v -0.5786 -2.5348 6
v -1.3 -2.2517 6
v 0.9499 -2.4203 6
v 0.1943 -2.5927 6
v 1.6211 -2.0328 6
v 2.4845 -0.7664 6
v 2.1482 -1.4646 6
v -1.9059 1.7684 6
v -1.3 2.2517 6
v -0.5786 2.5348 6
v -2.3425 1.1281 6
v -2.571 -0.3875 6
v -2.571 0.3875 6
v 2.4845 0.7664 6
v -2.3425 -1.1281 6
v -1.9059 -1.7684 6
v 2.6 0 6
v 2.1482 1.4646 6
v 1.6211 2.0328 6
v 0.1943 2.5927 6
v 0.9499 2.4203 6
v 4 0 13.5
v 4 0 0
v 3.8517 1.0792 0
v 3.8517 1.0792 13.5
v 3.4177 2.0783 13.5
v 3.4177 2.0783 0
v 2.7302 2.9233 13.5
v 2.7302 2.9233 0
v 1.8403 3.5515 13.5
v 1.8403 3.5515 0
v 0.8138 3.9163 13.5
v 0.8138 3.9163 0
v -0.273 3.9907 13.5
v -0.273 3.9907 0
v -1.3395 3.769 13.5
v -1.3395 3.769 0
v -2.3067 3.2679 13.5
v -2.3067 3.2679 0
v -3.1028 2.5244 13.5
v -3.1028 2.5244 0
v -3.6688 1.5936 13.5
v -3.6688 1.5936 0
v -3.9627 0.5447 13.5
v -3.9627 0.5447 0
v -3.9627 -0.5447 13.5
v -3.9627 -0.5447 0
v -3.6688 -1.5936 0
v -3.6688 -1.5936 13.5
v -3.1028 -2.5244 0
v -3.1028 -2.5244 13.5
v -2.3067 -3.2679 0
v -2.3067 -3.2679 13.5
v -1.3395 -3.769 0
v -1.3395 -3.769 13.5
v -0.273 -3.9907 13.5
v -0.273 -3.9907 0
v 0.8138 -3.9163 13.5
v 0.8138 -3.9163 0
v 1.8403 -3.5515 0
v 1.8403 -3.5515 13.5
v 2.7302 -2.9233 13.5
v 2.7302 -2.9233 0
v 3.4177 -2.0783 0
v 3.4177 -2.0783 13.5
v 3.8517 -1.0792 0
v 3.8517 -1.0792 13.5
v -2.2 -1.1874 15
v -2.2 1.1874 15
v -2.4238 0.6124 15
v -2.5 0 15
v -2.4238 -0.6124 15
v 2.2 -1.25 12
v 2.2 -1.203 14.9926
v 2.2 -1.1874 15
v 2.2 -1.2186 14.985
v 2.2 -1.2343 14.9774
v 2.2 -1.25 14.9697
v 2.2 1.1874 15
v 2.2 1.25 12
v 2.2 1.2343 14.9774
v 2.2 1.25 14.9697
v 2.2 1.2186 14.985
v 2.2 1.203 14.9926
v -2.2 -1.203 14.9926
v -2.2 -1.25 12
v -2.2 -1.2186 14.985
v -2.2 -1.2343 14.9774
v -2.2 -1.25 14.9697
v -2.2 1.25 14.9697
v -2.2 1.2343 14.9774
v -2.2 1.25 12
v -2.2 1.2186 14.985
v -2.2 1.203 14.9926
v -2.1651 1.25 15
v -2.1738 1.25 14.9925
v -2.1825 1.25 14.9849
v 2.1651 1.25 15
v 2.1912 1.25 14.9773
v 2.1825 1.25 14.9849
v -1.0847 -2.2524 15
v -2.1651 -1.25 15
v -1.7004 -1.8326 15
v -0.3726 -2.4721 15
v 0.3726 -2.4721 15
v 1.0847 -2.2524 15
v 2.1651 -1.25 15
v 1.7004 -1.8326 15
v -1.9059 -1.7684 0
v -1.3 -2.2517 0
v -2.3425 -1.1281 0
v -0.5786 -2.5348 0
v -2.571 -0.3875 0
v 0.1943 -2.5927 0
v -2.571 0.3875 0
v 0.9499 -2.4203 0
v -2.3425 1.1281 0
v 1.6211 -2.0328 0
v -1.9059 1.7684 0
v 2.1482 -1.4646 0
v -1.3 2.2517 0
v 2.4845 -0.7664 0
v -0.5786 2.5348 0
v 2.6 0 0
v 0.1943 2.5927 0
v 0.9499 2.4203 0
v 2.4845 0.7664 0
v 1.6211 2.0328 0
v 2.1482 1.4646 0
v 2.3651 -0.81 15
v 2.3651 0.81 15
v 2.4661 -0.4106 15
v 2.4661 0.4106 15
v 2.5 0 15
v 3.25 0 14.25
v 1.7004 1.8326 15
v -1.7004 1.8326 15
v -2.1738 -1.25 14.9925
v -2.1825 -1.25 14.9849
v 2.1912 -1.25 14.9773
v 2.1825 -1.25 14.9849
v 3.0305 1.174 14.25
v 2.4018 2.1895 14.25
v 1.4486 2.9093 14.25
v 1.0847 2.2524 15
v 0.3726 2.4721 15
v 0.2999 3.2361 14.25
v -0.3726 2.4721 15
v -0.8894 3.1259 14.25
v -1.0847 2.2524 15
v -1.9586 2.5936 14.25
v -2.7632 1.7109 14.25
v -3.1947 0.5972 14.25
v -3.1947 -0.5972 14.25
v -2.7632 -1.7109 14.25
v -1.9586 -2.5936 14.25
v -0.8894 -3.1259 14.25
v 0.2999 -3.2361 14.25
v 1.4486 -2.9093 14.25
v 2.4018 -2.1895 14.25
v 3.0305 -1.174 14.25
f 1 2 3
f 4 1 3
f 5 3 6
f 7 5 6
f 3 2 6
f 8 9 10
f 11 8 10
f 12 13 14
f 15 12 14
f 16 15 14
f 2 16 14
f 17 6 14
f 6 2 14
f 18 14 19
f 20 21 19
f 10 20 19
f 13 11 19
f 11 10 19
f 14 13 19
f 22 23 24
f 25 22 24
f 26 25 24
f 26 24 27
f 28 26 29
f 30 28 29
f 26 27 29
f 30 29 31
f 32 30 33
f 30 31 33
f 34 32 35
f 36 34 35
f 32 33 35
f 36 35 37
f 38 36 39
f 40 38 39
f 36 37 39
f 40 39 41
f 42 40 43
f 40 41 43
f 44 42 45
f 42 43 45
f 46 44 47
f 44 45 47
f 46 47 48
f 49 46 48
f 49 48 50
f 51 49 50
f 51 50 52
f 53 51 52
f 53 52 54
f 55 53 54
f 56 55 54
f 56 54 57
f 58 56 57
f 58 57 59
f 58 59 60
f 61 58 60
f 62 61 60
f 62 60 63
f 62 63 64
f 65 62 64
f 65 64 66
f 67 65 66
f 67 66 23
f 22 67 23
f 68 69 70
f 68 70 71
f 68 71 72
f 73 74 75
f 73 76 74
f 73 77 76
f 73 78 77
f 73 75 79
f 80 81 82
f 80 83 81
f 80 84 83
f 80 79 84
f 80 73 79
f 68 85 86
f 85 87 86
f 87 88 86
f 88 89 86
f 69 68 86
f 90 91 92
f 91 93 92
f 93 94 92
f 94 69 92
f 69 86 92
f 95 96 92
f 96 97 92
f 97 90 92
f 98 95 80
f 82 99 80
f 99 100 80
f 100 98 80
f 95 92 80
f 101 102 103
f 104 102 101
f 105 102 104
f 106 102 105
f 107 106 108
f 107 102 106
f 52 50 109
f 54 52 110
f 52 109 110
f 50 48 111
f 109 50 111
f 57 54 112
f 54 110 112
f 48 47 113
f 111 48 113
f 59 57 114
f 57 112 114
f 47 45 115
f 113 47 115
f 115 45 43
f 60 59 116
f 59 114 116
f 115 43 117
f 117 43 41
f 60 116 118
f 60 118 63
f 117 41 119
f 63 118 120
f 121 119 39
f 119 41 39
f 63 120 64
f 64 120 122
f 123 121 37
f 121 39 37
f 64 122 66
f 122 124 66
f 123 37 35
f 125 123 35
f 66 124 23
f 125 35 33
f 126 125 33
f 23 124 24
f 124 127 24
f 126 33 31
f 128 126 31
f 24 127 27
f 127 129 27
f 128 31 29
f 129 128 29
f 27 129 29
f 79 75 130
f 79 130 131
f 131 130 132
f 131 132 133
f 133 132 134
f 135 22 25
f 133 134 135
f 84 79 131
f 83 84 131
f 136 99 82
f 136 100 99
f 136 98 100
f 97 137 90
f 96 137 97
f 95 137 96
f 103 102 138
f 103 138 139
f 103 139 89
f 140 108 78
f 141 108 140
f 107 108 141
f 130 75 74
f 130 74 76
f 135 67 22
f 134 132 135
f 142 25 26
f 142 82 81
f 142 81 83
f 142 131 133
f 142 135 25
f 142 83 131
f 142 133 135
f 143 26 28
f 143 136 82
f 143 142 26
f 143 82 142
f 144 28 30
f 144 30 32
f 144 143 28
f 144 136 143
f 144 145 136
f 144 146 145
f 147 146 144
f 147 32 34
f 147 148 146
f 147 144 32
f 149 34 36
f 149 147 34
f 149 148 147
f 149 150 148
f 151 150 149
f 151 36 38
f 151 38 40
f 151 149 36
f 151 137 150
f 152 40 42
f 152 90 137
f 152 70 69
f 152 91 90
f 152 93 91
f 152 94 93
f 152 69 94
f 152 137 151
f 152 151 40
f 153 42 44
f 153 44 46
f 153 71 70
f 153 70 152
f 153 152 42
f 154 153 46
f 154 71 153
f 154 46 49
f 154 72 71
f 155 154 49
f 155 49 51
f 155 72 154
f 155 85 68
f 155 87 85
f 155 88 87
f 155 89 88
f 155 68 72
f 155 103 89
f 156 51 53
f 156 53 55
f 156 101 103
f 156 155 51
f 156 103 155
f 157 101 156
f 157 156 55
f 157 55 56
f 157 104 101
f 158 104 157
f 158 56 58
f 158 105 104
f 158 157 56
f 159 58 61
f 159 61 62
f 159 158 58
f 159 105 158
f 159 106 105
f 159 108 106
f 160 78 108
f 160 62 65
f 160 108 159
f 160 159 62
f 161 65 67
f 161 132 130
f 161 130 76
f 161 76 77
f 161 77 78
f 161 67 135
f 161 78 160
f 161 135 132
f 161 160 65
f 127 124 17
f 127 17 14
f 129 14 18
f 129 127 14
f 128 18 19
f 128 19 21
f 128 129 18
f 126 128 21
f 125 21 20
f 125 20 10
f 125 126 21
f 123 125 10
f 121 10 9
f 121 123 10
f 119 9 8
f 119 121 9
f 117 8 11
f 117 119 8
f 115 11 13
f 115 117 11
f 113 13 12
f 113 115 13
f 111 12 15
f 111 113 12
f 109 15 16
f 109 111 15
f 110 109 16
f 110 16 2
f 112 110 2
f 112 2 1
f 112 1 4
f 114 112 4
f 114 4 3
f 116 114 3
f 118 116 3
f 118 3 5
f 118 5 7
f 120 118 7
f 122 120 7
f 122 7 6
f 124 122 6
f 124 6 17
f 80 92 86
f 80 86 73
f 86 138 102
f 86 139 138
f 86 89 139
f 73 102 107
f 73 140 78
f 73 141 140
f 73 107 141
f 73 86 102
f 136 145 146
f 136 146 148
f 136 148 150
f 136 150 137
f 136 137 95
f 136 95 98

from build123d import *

# Parameters (mm, degrees)
F0_R     = 4
F0_R_2   = 2.6
F1_DEPTH = 15
F2_START = 6
F0_W     = 4.4
F0_H     = 2.5
F2_DEPTH = 9
F3_START = 6
F3_DEPTH = 6


# Not quite as in the source:
# - a fillet or chamfer that OpenCascade refuses, or shapes differently, is made with other operations: its cross-section is extruded or revolved along the edge and cut away or added


with BuildPart() as f1:
    # F0 (on Top) → F1 (new body)
    with BuildSketch(Plane.XY):
        Circle(F0_R)
        Circle(F0_R_2, mode=Mode.SUBTRACT)
    extrude(amount=F1_DEPTH)

    # F0 (on Top) → F2 (join)
    with BuildSketch(Plane.XY.offset(F2_START)):
        Circle(F0_R_2)
        Rectangle(F0_W, F0_H, mode=Mode.SUBTRACT)
    extrude(amount=F2_DEPTH)

    # F0 (on Top) → F3 (join)
    with BuildSketch(Plane.XY.offset(F3_START)):
        Rectangle(F0_W, F0_H)
    extrude(amount=F3_DEPTH)

    # F4: chamfer of 1.5 on 1 edges, made by hand

    # F4_s1 → F4_t2 (revolve, cut)
    with BuildSketch(Plane.XZ):
        Polygon((4, 13.5), (2.5, 15), (4, 15), align=None)
    revolve(axis=Axis((0, 0, 15), (0, 0, 1)), mode=Mode.SUBTRACT)


solid = f1.part
